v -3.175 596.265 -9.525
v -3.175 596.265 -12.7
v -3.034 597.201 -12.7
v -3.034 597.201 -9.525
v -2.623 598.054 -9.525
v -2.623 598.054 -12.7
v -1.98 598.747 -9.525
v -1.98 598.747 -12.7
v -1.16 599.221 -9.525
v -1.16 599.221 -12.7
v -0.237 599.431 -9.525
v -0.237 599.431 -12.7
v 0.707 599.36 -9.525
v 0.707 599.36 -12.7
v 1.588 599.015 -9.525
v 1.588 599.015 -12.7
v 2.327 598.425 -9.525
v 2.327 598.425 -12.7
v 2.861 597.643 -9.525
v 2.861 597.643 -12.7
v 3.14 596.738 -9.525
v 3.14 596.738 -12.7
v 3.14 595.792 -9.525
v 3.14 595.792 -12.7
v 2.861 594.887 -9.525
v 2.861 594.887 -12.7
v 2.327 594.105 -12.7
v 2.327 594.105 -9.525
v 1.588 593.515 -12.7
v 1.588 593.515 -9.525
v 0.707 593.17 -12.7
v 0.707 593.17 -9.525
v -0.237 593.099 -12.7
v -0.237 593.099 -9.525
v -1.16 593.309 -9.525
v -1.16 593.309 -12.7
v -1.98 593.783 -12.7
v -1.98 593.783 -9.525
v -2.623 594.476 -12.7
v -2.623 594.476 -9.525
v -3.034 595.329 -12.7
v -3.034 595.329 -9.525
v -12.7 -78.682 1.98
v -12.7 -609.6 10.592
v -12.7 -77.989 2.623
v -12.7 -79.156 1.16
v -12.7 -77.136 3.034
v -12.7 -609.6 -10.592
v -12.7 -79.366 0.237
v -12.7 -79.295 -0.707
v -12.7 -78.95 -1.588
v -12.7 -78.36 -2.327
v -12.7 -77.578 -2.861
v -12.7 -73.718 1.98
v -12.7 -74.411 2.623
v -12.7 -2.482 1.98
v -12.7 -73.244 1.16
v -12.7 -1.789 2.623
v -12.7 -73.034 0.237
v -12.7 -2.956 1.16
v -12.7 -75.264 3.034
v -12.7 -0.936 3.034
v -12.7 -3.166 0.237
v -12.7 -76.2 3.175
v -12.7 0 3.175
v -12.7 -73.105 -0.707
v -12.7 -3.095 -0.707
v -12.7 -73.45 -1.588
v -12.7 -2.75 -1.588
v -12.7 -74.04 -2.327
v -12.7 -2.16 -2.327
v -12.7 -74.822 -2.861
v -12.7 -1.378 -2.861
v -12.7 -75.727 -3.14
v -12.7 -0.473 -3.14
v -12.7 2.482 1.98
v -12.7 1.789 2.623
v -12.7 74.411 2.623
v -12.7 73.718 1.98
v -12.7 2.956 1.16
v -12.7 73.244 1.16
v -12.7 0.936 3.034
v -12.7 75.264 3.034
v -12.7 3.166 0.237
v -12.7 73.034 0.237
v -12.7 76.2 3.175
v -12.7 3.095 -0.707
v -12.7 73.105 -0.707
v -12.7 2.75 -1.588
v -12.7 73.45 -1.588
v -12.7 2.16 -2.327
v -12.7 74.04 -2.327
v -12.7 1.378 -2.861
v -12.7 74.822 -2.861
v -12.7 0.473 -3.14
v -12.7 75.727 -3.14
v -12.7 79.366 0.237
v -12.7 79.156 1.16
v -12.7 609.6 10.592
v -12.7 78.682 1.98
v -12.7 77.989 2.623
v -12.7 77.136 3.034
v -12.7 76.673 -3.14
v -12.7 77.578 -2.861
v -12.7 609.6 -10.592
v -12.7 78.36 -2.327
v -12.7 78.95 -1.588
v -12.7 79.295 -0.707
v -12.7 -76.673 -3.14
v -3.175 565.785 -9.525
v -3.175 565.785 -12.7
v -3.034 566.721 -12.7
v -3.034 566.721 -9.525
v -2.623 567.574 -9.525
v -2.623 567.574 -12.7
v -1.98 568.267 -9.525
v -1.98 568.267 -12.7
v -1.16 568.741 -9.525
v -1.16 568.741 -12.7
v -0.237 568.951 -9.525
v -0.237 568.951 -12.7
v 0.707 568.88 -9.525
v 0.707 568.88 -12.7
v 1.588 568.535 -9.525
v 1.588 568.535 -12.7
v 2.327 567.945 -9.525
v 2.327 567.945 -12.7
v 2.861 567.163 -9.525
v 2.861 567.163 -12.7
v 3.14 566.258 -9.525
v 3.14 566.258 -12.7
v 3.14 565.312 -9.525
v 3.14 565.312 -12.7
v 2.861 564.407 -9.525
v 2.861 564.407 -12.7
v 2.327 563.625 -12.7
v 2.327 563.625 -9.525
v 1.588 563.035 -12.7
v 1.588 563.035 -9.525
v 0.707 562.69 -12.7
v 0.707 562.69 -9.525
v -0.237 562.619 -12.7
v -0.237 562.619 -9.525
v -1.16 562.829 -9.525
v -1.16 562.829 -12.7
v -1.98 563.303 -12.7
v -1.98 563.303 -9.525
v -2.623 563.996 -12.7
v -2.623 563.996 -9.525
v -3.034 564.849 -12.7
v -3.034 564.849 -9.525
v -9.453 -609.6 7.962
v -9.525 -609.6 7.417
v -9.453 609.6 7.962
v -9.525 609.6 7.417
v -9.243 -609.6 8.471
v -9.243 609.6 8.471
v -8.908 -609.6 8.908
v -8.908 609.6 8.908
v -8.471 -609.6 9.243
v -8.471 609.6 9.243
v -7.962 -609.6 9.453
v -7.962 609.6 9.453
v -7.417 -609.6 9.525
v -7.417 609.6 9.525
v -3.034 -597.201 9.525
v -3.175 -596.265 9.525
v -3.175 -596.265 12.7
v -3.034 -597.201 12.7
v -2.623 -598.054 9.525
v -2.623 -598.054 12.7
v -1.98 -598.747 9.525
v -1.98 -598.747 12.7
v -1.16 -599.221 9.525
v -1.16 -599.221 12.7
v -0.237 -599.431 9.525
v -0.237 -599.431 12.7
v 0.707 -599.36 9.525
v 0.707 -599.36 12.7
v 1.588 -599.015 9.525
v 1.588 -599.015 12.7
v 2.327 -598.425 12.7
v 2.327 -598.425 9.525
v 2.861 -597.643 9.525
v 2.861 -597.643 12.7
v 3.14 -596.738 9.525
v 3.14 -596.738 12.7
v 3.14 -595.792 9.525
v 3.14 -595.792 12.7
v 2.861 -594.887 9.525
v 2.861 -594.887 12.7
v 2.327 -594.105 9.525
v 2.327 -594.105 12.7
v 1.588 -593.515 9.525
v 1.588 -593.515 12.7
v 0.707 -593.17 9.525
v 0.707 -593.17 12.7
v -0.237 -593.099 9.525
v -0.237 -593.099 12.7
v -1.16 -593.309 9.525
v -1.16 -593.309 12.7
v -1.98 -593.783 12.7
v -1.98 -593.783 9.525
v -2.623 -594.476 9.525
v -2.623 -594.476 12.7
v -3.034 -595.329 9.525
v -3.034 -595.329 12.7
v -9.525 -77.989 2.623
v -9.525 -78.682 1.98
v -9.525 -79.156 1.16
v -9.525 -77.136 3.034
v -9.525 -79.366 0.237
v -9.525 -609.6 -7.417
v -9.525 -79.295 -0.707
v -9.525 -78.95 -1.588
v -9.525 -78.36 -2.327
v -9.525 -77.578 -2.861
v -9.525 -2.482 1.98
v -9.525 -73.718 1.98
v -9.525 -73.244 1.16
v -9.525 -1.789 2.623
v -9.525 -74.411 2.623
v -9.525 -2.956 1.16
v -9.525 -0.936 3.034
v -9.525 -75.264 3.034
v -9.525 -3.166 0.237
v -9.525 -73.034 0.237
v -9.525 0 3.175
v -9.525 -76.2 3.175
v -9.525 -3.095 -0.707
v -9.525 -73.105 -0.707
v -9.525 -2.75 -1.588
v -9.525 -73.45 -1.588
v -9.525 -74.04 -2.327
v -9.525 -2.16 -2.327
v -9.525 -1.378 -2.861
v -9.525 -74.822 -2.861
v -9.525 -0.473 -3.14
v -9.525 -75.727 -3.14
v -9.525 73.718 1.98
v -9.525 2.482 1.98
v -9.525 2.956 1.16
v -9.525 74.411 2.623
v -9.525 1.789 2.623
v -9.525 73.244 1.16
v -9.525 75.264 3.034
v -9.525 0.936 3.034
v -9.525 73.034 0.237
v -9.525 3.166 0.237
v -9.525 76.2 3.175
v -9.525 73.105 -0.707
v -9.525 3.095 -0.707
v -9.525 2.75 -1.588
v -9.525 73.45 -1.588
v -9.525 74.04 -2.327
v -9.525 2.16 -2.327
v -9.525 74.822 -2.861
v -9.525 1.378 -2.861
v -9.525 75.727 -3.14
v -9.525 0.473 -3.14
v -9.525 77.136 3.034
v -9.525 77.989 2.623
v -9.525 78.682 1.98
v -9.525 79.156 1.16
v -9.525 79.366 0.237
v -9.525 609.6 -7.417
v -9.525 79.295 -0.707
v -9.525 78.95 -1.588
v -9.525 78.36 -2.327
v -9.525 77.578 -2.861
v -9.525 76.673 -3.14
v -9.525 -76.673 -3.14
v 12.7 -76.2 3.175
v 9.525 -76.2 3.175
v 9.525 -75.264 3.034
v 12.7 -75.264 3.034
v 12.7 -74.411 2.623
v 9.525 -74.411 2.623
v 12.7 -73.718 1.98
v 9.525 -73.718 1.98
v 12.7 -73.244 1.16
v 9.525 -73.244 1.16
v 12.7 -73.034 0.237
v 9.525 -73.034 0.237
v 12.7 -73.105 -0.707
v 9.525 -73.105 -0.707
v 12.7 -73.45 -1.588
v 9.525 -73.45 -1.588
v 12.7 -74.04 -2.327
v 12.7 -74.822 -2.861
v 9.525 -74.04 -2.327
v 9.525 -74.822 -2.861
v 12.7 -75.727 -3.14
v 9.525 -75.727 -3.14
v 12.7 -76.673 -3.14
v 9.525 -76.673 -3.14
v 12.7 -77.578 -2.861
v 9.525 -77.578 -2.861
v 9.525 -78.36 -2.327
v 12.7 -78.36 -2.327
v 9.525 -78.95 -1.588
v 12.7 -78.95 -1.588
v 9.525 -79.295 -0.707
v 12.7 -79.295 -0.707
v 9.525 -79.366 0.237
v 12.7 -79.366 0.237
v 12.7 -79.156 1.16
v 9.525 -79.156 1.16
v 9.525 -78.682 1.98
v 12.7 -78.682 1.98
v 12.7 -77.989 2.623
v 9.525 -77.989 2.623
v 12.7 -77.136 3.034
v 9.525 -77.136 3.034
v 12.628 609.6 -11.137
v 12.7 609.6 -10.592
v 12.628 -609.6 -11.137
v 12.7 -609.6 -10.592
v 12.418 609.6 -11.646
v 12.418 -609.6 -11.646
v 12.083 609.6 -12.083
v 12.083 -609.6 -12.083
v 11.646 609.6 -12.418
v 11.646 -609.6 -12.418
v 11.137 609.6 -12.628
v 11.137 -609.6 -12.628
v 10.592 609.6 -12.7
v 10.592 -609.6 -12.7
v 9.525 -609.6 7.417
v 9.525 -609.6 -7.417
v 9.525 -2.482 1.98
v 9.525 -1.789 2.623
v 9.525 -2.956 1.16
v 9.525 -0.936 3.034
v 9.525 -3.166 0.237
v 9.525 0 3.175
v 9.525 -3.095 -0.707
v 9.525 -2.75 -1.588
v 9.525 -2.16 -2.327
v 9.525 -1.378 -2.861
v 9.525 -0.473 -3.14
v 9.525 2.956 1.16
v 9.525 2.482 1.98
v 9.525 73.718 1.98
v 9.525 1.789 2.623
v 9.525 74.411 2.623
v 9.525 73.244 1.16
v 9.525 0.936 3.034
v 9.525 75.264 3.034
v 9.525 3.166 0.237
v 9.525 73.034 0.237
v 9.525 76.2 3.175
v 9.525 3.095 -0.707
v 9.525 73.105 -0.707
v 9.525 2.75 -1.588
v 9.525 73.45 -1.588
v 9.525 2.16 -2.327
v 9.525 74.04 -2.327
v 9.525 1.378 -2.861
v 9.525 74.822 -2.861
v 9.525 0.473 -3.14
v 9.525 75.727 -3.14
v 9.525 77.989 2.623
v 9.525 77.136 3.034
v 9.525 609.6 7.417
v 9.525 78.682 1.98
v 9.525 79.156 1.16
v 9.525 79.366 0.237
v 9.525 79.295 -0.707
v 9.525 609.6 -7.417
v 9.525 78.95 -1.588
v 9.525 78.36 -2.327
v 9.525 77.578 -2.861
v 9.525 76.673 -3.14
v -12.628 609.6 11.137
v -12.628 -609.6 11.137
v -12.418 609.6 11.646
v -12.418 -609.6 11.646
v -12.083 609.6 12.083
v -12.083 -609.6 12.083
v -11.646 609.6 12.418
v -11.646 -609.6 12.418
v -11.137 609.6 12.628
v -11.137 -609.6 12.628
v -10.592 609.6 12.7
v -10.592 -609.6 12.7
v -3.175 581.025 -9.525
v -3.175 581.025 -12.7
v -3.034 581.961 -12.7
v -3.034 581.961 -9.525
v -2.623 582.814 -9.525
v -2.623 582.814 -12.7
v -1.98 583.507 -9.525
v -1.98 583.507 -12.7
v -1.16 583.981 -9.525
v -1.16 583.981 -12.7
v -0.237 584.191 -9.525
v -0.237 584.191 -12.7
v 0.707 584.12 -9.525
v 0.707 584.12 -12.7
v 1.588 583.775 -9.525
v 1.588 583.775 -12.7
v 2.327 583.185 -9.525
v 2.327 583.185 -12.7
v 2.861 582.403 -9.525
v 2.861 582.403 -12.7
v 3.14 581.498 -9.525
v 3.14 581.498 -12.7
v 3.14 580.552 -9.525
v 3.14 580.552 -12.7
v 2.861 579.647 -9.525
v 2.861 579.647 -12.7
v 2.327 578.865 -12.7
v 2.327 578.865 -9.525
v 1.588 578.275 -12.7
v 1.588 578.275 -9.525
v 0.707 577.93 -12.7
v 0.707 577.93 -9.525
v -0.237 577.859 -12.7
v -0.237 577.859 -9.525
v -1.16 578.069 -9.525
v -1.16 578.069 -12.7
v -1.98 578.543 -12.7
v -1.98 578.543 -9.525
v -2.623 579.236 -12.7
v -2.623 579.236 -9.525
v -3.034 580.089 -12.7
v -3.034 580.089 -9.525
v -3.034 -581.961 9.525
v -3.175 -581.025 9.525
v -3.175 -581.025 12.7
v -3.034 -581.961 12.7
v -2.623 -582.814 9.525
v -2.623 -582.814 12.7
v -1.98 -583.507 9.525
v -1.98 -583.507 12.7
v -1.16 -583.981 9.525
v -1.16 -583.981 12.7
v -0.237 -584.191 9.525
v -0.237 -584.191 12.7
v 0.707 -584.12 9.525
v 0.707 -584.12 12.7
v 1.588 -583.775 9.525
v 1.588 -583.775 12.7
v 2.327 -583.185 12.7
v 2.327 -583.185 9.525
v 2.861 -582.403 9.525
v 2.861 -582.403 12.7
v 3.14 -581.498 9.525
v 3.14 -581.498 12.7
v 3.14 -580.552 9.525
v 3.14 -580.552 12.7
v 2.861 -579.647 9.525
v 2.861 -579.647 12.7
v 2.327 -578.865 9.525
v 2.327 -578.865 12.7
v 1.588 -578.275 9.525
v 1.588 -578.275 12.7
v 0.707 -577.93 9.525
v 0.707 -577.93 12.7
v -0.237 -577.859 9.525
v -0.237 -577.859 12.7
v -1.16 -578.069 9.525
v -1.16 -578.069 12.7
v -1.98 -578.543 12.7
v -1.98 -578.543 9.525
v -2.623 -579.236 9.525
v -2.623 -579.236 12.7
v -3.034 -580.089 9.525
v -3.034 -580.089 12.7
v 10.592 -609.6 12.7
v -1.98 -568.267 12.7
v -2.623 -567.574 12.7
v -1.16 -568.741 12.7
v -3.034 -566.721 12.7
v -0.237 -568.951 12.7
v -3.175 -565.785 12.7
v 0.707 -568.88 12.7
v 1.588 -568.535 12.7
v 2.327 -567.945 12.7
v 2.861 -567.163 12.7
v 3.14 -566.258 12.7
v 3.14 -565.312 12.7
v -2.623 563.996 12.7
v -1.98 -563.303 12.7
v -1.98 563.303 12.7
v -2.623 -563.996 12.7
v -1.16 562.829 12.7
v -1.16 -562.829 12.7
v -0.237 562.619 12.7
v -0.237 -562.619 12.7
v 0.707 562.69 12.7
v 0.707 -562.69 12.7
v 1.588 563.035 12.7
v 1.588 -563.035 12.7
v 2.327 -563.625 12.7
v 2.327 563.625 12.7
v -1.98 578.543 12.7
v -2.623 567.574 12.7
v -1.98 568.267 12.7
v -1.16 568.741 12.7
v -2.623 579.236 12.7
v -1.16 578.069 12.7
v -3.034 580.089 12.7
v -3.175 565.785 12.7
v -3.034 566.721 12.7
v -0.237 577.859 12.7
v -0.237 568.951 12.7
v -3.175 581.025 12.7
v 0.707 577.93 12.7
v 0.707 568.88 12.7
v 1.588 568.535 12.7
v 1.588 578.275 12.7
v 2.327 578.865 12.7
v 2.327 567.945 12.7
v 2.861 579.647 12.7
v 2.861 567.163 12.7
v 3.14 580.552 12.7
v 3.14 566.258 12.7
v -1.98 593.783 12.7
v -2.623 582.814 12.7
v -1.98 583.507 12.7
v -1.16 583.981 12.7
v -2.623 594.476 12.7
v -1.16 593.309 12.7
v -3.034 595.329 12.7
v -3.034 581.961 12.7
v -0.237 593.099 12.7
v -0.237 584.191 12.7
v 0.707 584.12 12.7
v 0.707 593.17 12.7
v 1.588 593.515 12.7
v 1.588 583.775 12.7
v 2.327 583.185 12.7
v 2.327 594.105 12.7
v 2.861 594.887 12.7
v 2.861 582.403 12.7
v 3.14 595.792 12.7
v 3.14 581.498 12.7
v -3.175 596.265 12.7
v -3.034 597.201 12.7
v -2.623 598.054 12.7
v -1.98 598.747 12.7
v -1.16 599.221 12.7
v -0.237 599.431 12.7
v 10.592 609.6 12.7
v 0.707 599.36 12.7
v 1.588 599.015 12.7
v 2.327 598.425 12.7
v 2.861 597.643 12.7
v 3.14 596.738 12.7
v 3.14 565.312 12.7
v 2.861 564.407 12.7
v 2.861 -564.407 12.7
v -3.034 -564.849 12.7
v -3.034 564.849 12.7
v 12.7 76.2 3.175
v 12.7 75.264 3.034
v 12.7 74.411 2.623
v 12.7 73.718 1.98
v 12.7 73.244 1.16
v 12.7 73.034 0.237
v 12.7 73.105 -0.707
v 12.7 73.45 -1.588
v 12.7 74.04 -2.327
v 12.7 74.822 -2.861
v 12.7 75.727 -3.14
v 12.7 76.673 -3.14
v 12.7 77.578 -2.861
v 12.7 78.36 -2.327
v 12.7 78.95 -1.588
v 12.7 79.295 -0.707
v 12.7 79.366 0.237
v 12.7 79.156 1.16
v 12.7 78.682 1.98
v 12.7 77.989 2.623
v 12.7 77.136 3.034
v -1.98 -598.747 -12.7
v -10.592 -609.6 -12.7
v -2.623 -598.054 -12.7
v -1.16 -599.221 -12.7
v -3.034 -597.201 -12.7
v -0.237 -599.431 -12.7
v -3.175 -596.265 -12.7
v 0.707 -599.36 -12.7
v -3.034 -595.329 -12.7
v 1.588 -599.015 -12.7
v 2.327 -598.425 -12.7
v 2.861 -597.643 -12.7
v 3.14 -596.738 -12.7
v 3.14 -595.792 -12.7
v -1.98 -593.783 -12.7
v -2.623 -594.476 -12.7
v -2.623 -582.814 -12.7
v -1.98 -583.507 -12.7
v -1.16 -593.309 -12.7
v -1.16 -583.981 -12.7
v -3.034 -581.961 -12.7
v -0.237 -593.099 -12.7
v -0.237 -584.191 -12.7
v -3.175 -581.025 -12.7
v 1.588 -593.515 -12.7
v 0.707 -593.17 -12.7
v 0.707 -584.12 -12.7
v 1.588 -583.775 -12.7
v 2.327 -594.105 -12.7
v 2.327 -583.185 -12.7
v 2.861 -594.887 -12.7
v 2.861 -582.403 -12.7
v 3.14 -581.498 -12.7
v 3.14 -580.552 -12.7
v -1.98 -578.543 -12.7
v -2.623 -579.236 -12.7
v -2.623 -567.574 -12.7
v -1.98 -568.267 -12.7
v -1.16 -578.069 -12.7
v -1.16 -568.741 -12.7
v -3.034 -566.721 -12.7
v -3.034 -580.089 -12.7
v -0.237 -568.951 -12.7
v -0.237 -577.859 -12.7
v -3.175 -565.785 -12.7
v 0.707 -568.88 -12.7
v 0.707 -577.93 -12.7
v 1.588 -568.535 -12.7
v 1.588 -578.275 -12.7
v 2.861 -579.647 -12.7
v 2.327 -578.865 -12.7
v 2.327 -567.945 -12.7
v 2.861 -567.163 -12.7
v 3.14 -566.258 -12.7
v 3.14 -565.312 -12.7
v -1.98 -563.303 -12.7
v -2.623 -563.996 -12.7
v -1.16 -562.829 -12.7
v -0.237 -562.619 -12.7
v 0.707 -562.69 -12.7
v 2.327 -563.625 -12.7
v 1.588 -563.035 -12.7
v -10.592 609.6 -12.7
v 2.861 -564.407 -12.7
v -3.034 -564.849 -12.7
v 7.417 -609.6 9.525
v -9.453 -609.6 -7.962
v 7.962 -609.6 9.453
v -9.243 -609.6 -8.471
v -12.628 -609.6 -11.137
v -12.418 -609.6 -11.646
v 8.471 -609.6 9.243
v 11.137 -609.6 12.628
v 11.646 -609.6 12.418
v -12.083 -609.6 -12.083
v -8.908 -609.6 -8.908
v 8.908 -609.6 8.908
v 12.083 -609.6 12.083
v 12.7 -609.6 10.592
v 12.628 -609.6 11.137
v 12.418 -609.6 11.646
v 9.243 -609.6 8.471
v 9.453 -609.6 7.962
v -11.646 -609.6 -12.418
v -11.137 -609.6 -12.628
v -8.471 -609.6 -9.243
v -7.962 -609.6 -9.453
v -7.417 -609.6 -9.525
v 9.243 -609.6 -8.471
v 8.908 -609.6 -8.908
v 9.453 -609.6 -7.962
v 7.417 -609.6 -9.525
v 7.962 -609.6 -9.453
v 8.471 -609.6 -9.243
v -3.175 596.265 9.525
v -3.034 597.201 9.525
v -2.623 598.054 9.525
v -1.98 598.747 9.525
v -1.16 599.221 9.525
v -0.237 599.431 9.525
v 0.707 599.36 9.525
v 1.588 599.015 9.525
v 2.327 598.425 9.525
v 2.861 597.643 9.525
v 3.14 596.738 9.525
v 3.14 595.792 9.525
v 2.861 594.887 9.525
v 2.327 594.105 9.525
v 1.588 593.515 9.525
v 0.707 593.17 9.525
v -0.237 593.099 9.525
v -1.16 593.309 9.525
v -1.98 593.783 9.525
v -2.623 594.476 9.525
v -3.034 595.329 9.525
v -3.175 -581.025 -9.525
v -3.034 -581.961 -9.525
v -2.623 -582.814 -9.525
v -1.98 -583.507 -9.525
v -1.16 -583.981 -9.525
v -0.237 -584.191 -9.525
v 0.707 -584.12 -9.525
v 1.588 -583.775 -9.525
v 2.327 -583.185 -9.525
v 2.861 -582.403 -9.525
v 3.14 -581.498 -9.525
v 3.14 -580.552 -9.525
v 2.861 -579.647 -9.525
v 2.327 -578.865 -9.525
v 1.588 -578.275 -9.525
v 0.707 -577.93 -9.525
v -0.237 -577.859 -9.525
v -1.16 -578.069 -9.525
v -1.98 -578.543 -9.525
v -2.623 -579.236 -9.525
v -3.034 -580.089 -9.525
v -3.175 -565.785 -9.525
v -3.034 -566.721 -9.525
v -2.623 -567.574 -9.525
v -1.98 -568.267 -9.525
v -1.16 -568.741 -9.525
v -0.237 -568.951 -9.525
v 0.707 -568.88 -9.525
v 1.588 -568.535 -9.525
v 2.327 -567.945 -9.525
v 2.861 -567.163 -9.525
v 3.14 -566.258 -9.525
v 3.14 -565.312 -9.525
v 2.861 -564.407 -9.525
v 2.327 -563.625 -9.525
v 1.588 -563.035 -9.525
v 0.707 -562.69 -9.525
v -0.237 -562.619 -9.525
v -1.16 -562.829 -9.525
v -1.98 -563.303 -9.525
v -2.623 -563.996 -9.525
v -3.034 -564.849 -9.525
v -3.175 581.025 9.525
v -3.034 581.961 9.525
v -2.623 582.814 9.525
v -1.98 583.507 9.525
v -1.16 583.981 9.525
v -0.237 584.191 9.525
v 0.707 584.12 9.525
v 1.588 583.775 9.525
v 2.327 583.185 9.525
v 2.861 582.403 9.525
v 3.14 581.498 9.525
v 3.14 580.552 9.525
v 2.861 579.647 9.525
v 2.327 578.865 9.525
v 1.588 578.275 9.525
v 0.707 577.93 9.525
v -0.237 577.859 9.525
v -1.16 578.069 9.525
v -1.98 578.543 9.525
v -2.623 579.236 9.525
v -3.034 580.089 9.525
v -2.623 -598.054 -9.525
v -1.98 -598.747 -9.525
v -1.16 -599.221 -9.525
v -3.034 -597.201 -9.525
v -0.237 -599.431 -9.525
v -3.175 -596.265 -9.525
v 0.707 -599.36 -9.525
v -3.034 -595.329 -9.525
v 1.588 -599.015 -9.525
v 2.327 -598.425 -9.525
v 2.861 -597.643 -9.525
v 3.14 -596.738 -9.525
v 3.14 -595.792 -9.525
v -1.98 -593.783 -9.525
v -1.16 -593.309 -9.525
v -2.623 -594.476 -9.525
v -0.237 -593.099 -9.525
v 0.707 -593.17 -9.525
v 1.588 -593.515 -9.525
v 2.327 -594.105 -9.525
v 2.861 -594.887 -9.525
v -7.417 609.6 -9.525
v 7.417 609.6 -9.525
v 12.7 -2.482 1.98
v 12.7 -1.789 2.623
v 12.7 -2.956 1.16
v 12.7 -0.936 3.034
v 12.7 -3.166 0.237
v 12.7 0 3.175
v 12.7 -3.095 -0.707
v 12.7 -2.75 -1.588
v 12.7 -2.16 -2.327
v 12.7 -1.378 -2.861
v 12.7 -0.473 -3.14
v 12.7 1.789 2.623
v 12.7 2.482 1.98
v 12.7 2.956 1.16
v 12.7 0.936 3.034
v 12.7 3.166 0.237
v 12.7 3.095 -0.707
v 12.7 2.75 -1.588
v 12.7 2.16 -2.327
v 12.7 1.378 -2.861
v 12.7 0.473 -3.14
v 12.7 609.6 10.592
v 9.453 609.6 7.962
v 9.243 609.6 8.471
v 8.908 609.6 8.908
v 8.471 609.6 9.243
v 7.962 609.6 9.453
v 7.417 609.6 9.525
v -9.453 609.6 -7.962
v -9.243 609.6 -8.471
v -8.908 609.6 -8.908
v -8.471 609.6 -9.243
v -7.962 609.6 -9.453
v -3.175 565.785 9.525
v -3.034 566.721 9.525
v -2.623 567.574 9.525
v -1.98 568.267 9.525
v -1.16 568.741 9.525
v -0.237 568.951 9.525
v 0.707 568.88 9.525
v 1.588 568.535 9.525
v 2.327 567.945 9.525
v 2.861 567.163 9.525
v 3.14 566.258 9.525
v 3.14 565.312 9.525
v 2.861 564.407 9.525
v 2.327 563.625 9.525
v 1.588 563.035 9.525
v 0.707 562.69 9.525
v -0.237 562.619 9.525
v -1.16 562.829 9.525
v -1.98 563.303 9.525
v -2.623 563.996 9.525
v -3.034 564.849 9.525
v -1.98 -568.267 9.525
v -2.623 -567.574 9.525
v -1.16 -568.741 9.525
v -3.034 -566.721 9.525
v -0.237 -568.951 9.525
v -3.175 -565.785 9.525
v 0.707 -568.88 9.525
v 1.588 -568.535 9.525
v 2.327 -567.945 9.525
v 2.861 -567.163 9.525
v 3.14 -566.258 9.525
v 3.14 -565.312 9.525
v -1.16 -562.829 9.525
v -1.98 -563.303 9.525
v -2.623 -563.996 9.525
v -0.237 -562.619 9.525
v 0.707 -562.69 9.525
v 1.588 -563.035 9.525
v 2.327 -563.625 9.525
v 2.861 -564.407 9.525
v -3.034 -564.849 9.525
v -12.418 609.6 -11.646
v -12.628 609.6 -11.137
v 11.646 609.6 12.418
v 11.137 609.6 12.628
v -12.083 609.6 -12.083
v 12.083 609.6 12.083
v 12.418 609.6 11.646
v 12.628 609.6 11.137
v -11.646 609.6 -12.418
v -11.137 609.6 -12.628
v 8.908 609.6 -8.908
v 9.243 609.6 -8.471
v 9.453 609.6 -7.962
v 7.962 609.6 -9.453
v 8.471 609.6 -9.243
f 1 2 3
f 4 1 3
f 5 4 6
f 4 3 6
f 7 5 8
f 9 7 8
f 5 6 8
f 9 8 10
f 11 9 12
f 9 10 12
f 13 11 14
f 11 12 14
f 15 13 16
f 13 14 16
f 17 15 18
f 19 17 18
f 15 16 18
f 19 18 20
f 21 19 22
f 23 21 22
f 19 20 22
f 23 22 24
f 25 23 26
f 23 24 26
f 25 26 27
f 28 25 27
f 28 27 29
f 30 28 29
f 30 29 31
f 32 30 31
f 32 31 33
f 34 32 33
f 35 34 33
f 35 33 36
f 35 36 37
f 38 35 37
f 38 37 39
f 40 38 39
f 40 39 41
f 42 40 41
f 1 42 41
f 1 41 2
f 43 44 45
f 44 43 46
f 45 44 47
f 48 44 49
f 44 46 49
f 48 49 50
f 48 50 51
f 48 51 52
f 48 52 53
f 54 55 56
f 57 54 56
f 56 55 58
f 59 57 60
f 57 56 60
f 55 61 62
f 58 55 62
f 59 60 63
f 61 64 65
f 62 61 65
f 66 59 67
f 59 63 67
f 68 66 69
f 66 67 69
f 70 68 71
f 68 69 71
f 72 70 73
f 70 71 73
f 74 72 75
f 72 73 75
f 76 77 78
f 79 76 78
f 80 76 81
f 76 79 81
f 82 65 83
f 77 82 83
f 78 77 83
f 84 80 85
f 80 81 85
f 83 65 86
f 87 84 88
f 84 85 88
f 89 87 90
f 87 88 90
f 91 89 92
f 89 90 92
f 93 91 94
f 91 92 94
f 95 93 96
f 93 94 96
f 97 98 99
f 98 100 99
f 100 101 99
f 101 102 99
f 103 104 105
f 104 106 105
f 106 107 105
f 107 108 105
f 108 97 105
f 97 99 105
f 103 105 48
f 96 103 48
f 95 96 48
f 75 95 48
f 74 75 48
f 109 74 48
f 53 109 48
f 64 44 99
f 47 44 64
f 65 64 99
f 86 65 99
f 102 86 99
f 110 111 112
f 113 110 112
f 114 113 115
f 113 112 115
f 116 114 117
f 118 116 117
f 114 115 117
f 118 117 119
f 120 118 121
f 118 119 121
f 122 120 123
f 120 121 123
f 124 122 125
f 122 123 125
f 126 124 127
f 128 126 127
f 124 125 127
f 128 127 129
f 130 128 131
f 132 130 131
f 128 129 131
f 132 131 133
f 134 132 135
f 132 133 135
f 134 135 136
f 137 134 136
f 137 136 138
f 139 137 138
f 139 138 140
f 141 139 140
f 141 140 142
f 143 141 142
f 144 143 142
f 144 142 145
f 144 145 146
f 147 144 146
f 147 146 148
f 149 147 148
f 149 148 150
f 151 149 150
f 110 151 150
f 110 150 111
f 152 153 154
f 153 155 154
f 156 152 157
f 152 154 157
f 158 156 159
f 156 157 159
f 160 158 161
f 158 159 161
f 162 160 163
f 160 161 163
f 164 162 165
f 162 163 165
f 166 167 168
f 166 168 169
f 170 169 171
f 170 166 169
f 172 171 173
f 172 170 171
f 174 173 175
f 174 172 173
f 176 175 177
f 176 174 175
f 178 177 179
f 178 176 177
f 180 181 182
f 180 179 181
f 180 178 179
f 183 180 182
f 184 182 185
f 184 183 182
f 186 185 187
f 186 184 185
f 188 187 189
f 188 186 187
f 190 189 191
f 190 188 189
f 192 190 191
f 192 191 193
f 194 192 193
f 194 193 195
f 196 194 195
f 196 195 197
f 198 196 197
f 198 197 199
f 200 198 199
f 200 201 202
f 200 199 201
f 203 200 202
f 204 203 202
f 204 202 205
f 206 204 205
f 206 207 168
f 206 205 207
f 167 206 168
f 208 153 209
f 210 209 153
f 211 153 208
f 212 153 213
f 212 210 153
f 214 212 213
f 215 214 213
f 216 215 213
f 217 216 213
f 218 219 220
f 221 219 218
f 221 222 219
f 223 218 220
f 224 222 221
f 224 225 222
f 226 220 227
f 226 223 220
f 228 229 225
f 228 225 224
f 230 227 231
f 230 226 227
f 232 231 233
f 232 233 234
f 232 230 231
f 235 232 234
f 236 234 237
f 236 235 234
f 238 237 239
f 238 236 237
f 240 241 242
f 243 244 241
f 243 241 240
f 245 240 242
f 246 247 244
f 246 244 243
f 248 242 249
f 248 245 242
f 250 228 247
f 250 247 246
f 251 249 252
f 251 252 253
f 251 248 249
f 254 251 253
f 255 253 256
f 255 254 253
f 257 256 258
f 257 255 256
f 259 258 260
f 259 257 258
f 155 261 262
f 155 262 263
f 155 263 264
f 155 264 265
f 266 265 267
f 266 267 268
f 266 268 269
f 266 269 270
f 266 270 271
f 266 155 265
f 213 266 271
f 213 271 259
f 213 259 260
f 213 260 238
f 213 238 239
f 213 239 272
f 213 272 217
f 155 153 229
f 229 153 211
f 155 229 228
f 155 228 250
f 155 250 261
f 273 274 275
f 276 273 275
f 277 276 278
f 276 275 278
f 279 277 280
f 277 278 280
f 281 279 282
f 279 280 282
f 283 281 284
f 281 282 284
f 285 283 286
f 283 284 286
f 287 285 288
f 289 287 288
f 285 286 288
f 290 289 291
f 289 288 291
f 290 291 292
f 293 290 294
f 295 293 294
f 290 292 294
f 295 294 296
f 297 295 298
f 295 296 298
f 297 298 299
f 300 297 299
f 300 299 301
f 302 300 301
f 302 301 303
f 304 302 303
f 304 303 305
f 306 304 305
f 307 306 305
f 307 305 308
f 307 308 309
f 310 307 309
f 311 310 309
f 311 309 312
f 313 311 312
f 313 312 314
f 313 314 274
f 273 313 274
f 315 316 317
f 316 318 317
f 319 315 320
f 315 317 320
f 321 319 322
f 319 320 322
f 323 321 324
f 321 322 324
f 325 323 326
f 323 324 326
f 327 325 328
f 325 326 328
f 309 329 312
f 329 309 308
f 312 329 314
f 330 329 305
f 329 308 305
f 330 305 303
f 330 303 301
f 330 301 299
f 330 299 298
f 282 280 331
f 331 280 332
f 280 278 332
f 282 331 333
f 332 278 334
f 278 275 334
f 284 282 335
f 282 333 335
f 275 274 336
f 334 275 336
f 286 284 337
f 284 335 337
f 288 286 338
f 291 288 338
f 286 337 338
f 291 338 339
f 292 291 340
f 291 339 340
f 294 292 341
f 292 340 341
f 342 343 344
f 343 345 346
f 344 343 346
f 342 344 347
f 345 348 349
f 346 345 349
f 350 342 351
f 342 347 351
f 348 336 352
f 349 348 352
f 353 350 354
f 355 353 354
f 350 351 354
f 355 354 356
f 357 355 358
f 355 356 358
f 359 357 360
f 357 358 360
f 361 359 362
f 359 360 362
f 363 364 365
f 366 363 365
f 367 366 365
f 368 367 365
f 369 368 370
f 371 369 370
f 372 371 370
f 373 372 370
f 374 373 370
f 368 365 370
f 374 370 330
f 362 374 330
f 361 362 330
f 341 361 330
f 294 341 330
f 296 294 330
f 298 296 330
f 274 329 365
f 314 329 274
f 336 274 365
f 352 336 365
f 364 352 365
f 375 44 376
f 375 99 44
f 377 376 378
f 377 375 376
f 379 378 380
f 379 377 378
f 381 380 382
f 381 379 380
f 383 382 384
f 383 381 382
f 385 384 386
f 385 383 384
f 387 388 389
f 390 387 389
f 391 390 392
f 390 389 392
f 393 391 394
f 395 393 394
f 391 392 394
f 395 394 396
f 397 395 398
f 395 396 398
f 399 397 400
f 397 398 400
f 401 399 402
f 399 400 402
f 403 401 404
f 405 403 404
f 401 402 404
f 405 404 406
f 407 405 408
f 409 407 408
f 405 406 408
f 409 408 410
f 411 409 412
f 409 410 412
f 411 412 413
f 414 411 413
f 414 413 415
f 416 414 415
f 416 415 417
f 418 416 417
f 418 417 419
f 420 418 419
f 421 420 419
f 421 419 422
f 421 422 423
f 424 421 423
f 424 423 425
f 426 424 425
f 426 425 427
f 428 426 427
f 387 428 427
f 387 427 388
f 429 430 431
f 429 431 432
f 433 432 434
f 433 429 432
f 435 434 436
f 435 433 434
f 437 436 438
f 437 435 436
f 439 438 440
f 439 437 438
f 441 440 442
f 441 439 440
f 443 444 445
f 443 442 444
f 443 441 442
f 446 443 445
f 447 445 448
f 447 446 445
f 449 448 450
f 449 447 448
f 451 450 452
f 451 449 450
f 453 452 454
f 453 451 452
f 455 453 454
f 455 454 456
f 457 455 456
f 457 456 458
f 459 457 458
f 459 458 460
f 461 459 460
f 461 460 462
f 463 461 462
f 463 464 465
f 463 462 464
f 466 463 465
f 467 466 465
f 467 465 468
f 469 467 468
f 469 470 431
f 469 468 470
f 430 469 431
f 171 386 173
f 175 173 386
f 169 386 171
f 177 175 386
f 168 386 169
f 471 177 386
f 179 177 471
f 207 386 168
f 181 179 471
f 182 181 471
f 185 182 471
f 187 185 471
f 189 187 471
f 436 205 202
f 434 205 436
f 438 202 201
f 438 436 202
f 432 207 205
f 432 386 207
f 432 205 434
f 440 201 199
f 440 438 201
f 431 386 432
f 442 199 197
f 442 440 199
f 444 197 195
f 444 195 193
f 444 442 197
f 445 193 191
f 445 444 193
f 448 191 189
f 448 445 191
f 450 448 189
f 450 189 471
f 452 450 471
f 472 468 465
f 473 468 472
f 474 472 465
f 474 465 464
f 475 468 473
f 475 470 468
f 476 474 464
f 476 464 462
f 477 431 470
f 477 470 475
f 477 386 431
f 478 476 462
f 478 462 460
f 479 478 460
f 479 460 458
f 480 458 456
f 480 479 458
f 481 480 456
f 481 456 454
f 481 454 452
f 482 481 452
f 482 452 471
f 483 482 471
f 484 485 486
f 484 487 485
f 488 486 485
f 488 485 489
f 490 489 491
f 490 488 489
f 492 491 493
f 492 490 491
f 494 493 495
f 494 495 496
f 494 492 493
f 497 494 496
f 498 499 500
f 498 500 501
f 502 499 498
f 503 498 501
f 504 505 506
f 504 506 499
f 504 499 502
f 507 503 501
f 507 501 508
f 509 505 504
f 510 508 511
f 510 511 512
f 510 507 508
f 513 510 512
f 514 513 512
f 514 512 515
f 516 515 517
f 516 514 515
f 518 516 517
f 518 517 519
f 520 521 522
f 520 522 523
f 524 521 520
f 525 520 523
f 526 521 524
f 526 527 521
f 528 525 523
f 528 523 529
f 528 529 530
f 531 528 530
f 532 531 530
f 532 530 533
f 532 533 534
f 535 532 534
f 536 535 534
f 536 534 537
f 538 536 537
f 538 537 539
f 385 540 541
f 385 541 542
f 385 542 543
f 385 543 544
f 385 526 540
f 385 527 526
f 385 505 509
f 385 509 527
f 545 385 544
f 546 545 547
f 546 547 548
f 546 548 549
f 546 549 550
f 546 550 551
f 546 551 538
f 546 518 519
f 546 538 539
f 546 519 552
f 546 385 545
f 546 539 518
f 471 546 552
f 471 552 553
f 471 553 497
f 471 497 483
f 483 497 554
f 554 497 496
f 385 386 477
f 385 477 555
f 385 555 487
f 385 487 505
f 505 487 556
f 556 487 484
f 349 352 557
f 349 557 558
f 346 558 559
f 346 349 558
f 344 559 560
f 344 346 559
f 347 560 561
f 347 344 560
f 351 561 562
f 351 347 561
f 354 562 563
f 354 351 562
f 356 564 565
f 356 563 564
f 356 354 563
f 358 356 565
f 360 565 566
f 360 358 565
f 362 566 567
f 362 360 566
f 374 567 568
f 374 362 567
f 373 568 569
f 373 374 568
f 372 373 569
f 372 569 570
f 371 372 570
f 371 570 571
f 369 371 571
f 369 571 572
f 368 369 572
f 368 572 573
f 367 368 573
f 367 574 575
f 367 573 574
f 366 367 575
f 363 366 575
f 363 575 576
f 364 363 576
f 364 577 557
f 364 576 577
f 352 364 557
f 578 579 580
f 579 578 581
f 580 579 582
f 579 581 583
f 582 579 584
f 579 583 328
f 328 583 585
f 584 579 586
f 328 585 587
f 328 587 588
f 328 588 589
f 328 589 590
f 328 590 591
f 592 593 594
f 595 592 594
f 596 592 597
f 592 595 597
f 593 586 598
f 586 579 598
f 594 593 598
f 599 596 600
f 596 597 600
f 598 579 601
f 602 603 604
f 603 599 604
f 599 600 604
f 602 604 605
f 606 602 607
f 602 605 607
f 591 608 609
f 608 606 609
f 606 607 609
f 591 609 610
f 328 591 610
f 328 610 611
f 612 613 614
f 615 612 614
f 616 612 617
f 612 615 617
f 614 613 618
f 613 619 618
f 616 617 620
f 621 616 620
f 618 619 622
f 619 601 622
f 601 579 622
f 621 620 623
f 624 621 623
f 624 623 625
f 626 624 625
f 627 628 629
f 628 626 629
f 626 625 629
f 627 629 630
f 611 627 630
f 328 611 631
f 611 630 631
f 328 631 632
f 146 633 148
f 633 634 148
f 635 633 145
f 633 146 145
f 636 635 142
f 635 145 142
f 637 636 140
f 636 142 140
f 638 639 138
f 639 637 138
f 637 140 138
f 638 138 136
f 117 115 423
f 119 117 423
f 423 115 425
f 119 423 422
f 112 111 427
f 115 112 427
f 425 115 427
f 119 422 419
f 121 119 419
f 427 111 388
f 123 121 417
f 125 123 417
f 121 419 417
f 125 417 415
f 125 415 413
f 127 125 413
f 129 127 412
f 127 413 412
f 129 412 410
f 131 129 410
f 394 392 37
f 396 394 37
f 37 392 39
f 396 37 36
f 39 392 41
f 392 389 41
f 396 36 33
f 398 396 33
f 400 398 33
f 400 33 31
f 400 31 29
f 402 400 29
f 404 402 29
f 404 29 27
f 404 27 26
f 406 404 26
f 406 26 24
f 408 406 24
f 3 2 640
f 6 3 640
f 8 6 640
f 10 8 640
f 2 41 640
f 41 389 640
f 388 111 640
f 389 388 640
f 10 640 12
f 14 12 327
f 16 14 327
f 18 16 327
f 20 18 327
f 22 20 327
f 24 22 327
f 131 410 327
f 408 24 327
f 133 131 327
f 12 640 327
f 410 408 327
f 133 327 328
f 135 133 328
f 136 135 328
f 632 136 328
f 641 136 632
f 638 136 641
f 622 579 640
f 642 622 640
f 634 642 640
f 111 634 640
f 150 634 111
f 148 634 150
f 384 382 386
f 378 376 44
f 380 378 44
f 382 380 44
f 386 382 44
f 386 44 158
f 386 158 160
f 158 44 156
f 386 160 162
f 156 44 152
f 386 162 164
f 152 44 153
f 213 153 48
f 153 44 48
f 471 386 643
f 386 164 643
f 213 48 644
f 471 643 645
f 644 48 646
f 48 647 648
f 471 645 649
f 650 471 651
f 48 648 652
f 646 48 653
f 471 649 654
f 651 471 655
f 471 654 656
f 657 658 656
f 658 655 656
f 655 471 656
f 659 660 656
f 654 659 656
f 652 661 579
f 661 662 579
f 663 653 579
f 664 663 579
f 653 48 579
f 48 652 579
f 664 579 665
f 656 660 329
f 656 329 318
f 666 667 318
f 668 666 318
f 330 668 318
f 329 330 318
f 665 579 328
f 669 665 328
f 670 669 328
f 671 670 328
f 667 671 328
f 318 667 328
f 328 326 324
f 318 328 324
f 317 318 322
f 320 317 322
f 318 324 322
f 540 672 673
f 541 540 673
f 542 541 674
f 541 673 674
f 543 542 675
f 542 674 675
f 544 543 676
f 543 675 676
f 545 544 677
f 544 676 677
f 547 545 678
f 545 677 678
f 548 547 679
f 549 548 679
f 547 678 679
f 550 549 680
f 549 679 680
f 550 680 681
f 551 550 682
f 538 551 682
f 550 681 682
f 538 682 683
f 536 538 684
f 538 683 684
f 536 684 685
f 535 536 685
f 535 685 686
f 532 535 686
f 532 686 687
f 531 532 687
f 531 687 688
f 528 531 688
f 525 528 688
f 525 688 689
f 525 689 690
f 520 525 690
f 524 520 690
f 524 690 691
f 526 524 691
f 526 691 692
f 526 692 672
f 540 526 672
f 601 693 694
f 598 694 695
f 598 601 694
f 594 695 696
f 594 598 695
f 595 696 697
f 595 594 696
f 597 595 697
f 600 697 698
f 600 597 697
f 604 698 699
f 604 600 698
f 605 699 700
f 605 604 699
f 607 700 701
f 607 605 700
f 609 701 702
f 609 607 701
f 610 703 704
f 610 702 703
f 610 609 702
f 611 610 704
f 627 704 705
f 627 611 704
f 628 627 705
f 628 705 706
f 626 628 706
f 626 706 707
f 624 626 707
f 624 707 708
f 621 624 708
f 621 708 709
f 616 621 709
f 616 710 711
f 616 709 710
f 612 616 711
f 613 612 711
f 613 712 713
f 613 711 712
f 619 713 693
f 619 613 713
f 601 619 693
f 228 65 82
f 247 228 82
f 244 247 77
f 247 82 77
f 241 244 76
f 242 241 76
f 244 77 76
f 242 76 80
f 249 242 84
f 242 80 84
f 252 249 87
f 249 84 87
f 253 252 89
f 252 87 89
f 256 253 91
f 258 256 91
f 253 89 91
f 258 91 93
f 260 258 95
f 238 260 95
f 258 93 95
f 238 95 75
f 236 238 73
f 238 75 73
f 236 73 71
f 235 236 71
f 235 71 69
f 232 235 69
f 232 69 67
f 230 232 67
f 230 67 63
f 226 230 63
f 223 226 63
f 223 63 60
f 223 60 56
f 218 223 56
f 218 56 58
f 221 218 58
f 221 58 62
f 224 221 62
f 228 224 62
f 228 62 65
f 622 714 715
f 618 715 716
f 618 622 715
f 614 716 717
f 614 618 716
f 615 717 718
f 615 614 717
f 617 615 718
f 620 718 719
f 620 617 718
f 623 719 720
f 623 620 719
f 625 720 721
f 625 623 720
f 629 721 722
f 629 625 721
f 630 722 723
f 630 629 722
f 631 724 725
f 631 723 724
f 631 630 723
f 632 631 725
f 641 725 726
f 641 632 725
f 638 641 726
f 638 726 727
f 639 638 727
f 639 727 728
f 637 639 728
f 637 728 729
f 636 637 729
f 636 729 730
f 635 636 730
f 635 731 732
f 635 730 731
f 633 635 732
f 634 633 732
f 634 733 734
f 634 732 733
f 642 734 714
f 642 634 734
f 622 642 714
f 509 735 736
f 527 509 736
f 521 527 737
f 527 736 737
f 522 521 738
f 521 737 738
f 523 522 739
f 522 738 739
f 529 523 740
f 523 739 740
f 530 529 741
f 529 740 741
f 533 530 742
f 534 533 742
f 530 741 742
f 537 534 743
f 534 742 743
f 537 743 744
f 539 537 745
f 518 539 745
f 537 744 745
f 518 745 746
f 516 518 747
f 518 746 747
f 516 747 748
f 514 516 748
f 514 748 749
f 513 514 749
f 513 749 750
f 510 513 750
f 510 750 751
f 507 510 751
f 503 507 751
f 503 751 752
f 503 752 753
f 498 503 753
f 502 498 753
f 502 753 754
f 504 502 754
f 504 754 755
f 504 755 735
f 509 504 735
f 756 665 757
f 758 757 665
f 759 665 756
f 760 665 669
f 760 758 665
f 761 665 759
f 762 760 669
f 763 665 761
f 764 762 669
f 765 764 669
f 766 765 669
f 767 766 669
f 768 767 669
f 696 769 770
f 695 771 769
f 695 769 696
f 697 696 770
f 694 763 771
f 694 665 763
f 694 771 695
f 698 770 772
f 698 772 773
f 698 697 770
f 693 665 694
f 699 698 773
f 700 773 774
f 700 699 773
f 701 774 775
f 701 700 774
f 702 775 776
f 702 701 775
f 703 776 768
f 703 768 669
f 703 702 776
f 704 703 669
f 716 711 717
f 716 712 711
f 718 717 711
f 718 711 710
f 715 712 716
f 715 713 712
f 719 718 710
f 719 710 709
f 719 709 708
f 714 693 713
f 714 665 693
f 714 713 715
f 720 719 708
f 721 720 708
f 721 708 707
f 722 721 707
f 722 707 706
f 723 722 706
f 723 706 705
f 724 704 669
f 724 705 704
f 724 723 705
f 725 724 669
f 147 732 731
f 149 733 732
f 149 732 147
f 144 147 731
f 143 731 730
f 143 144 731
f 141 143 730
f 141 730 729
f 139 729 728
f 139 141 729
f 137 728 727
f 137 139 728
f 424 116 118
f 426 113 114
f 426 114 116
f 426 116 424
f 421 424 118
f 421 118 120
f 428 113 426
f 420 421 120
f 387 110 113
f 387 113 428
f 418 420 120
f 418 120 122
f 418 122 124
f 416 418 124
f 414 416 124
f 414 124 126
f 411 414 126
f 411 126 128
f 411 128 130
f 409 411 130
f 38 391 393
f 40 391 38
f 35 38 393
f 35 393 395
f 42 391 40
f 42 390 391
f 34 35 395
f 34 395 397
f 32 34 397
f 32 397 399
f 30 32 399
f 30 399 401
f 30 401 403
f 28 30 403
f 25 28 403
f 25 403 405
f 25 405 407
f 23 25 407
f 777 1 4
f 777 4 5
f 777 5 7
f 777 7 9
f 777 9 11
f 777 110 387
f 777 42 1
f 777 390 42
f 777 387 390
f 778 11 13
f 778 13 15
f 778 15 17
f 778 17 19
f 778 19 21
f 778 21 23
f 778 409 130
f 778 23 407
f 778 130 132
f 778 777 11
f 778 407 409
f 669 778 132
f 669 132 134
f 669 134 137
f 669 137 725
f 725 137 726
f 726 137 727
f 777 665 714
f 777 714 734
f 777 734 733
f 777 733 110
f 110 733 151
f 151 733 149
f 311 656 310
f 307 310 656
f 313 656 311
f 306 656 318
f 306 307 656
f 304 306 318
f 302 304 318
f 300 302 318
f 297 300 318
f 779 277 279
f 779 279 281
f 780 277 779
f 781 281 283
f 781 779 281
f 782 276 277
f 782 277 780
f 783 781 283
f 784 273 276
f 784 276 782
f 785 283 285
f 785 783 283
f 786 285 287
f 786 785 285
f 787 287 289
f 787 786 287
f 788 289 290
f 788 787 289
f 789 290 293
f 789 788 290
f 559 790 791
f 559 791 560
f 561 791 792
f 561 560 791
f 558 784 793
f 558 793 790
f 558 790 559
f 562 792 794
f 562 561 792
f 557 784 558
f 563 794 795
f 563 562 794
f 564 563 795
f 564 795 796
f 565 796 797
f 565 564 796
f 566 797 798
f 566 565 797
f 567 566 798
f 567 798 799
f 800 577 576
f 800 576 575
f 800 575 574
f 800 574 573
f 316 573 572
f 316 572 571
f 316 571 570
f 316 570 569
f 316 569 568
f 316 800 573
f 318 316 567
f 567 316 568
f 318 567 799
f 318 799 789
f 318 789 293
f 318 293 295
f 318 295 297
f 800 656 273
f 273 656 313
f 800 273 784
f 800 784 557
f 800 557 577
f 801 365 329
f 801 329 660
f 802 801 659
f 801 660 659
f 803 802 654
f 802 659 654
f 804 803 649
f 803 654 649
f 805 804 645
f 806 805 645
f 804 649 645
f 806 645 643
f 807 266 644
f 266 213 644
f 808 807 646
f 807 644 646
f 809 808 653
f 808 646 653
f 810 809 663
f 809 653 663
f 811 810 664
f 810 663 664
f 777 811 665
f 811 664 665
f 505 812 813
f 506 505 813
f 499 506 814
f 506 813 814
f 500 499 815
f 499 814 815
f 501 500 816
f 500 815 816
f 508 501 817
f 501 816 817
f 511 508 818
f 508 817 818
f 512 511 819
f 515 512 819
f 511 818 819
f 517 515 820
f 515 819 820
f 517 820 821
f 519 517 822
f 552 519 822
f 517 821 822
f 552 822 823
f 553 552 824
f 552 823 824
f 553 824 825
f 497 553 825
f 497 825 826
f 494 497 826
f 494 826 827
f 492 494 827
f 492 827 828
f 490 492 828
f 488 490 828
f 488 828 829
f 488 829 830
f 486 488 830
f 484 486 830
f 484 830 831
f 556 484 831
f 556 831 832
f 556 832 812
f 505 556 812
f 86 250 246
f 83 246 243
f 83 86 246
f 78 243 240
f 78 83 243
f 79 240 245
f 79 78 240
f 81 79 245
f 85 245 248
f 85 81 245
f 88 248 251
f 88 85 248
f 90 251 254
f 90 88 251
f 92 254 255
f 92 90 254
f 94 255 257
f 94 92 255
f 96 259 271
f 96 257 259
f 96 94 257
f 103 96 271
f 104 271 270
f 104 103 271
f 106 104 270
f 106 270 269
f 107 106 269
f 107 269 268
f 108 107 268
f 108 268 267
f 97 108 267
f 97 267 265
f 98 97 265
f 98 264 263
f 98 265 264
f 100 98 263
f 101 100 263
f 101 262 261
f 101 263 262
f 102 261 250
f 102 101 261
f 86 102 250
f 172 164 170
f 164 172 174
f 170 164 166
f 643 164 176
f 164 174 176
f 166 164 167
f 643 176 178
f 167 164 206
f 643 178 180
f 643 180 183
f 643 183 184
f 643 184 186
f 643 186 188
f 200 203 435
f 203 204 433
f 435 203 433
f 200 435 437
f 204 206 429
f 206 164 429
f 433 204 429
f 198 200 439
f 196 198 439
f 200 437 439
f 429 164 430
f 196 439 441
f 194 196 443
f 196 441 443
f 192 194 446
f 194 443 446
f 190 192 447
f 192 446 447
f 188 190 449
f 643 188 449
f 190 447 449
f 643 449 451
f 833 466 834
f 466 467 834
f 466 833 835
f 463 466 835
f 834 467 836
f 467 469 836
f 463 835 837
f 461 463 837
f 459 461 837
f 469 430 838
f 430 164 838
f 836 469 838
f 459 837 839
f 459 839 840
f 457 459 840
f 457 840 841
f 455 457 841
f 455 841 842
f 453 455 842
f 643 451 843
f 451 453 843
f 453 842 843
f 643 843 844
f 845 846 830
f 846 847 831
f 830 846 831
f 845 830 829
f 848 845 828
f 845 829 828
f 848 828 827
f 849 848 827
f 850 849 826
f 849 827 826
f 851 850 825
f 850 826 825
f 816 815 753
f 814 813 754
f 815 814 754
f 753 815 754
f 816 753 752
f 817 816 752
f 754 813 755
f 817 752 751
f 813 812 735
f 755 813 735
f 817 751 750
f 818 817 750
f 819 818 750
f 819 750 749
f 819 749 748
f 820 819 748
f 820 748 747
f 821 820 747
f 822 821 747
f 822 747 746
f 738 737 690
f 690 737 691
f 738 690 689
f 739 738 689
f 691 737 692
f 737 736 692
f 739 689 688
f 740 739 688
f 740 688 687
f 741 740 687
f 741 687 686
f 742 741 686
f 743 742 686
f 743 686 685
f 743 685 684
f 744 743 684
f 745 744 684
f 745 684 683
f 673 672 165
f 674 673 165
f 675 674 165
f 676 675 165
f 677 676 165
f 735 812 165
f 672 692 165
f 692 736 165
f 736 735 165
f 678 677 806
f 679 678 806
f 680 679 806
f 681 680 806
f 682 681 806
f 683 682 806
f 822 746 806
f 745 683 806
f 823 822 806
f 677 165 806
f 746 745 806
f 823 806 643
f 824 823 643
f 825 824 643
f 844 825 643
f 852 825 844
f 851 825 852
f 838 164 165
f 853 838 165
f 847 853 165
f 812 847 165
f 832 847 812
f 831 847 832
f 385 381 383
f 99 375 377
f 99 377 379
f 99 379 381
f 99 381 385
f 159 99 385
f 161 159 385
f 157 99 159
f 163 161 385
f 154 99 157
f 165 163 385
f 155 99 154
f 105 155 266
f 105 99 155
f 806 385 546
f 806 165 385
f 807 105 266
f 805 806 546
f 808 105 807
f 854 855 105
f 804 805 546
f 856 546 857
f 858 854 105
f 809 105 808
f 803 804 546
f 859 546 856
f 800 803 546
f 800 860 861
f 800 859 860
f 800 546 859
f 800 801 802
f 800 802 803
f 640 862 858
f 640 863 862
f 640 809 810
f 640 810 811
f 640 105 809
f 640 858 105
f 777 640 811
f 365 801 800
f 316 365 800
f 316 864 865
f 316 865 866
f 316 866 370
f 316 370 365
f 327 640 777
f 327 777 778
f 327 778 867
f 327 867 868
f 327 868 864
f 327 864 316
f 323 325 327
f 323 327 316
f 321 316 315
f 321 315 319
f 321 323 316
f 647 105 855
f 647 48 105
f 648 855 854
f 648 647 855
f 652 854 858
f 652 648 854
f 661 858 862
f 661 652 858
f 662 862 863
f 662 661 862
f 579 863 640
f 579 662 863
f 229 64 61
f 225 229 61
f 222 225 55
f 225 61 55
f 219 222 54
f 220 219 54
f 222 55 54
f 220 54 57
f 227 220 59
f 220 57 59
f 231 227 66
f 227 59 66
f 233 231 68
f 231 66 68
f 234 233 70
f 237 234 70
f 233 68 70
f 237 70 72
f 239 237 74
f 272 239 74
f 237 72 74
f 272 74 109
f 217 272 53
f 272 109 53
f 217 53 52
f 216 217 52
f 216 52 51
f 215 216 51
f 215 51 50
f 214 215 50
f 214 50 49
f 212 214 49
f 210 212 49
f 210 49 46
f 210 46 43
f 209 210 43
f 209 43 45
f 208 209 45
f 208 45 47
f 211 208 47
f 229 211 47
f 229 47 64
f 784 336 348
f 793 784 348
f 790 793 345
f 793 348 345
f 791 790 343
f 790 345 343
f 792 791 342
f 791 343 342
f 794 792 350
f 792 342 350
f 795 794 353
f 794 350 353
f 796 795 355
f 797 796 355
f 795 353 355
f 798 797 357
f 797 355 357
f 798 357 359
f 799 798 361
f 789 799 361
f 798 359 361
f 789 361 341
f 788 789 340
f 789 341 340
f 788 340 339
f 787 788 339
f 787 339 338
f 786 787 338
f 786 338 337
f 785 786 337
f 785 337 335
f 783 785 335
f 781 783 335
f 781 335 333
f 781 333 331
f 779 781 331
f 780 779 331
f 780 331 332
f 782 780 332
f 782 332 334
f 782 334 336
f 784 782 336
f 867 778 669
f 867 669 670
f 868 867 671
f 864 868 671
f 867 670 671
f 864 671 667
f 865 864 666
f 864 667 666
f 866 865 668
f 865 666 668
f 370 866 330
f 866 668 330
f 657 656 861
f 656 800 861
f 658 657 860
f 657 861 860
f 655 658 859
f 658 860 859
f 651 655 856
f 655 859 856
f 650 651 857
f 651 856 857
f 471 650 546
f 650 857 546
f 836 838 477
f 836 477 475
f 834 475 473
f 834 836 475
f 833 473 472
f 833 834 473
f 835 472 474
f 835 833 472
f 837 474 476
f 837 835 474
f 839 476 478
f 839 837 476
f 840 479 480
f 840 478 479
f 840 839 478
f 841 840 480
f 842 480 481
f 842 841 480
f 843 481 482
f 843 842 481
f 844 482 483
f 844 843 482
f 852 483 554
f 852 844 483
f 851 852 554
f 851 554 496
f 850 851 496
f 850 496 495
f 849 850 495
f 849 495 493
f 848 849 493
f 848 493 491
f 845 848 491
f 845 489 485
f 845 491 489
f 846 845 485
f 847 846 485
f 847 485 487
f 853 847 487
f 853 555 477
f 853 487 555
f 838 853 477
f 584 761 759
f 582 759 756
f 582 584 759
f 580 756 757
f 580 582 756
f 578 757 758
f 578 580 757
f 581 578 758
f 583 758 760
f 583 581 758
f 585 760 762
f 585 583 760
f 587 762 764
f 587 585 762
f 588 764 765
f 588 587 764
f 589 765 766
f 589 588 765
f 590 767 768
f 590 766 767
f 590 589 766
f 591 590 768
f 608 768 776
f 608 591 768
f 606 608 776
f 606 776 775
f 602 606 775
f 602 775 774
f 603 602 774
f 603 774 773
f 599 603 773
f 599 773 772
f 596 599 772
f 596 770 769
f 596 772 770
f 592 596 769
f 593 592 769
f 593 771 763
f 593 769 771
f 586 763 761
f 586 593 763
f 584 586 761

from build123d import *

# Parameters (mm, degrees)
SKETCH1_W           = 25.4
SKETCH1_H           = 25.4
SKETCH1_W_2         = 19.05
SKETCH1_H_2         = 19.05
BOSS_EXTRUDE1_DEPTH = 609.6
FILLET1_R           = 2.1082
SKETCH6_R           = 3.175
CUT_EXTRUDE5_DEPTH  = 611.261099858
SKETCH7_R           = 3.175
CUT_EXTRUDE6_DEPTH  = 611.261099858
SKETCH8_R           = 3.175
CUT_EXTRUDE7_DEPTH  = 611.261099858


with BuildPart() as part:
    # Sketch1 → Boss-Extrude1 (new, symmetric)
    with BuildSketch(Plane(origin=(0, 0, 0), x_dir=(1, 0, 0), z_dir=(0, 1, 0))):
        Rectangle(SKETCH1_W, SKETCH1_H)
        Rectangle(SKETCH1_W_2, SKETCH1_H_2, mode=Mode.SUBTRACT)
    extrude(amount=BOSS_EXTRUDE1_DEPTH, both=True)

    # Fillet1
    fillet1_edges = [part.edges().sort_by_distance(p)[0] for p in [
        (9.525, 0, 9.525),
        (9.525, 0, -9.525),
        (-9.525, 0, -9.525),
        (-9.525, 0, 9.525),
        (-12.7, 0, -12.7),
        (12.7, 0, -12.7),
        (12.7, 0, 12.7),
        (-12.7, 0, 12.7),
    ]]
    fillet(fillet1_edges, radius=FILLET1_R)

    # Sketch6 → Cut-Extrude5 (cut, through all)
    with BuildSketch(Plane(origin=(0, 0, -12.7), x_dir=(-1, 0, 0), z_dir=(0, 0, -1))):
        with Locations((0, 565.785)):
            Circle(SKETCH6_R)
        with Locations((0, 581.025)):
            Circle(SKETCH6_R)
        with Locations((0, 596.265)):
            Circle(SKETCH6_R)
    cut_extrude5 = extrude(amount=-CUT_EXTRUDE5_DEPTH, mode=Mode.SUBTRACT)

    # Sketch7 → Cut-Extrude6 (cut, through all)
    with BuildSketch(Plane.ZY.offset(12.7)):
        Circle(SKETCH7_R)
    extrude(amount=-CUT_EXTRUDE6_DEPTH, mode=Mode.SUBTRACT)

    # Sketch8 → Cut-Extrude7 (cut, through all)
    with BuildSketch(Plane.ZY.offset(12.7)):
        with Locations((0, -76.2)):
            Circle(SKETCH8_R)
    cut_extrude7 = extrude(amount=-CUT_EXTRUDE7_DEPTH, mode=Mode.SUBTRACT)

    # Mirror1: Cut-Extrude7 across plane
    add(cut_extrude7.mirror(Plane.ZX), mode=Mode.SUBTRACT)

    # Mirror2: Cut-Extrude5 across plane
    add(cut_extrude5.mirror(Plane.ZX), mode=Mode.SUBTRACT)


solid = part.part
